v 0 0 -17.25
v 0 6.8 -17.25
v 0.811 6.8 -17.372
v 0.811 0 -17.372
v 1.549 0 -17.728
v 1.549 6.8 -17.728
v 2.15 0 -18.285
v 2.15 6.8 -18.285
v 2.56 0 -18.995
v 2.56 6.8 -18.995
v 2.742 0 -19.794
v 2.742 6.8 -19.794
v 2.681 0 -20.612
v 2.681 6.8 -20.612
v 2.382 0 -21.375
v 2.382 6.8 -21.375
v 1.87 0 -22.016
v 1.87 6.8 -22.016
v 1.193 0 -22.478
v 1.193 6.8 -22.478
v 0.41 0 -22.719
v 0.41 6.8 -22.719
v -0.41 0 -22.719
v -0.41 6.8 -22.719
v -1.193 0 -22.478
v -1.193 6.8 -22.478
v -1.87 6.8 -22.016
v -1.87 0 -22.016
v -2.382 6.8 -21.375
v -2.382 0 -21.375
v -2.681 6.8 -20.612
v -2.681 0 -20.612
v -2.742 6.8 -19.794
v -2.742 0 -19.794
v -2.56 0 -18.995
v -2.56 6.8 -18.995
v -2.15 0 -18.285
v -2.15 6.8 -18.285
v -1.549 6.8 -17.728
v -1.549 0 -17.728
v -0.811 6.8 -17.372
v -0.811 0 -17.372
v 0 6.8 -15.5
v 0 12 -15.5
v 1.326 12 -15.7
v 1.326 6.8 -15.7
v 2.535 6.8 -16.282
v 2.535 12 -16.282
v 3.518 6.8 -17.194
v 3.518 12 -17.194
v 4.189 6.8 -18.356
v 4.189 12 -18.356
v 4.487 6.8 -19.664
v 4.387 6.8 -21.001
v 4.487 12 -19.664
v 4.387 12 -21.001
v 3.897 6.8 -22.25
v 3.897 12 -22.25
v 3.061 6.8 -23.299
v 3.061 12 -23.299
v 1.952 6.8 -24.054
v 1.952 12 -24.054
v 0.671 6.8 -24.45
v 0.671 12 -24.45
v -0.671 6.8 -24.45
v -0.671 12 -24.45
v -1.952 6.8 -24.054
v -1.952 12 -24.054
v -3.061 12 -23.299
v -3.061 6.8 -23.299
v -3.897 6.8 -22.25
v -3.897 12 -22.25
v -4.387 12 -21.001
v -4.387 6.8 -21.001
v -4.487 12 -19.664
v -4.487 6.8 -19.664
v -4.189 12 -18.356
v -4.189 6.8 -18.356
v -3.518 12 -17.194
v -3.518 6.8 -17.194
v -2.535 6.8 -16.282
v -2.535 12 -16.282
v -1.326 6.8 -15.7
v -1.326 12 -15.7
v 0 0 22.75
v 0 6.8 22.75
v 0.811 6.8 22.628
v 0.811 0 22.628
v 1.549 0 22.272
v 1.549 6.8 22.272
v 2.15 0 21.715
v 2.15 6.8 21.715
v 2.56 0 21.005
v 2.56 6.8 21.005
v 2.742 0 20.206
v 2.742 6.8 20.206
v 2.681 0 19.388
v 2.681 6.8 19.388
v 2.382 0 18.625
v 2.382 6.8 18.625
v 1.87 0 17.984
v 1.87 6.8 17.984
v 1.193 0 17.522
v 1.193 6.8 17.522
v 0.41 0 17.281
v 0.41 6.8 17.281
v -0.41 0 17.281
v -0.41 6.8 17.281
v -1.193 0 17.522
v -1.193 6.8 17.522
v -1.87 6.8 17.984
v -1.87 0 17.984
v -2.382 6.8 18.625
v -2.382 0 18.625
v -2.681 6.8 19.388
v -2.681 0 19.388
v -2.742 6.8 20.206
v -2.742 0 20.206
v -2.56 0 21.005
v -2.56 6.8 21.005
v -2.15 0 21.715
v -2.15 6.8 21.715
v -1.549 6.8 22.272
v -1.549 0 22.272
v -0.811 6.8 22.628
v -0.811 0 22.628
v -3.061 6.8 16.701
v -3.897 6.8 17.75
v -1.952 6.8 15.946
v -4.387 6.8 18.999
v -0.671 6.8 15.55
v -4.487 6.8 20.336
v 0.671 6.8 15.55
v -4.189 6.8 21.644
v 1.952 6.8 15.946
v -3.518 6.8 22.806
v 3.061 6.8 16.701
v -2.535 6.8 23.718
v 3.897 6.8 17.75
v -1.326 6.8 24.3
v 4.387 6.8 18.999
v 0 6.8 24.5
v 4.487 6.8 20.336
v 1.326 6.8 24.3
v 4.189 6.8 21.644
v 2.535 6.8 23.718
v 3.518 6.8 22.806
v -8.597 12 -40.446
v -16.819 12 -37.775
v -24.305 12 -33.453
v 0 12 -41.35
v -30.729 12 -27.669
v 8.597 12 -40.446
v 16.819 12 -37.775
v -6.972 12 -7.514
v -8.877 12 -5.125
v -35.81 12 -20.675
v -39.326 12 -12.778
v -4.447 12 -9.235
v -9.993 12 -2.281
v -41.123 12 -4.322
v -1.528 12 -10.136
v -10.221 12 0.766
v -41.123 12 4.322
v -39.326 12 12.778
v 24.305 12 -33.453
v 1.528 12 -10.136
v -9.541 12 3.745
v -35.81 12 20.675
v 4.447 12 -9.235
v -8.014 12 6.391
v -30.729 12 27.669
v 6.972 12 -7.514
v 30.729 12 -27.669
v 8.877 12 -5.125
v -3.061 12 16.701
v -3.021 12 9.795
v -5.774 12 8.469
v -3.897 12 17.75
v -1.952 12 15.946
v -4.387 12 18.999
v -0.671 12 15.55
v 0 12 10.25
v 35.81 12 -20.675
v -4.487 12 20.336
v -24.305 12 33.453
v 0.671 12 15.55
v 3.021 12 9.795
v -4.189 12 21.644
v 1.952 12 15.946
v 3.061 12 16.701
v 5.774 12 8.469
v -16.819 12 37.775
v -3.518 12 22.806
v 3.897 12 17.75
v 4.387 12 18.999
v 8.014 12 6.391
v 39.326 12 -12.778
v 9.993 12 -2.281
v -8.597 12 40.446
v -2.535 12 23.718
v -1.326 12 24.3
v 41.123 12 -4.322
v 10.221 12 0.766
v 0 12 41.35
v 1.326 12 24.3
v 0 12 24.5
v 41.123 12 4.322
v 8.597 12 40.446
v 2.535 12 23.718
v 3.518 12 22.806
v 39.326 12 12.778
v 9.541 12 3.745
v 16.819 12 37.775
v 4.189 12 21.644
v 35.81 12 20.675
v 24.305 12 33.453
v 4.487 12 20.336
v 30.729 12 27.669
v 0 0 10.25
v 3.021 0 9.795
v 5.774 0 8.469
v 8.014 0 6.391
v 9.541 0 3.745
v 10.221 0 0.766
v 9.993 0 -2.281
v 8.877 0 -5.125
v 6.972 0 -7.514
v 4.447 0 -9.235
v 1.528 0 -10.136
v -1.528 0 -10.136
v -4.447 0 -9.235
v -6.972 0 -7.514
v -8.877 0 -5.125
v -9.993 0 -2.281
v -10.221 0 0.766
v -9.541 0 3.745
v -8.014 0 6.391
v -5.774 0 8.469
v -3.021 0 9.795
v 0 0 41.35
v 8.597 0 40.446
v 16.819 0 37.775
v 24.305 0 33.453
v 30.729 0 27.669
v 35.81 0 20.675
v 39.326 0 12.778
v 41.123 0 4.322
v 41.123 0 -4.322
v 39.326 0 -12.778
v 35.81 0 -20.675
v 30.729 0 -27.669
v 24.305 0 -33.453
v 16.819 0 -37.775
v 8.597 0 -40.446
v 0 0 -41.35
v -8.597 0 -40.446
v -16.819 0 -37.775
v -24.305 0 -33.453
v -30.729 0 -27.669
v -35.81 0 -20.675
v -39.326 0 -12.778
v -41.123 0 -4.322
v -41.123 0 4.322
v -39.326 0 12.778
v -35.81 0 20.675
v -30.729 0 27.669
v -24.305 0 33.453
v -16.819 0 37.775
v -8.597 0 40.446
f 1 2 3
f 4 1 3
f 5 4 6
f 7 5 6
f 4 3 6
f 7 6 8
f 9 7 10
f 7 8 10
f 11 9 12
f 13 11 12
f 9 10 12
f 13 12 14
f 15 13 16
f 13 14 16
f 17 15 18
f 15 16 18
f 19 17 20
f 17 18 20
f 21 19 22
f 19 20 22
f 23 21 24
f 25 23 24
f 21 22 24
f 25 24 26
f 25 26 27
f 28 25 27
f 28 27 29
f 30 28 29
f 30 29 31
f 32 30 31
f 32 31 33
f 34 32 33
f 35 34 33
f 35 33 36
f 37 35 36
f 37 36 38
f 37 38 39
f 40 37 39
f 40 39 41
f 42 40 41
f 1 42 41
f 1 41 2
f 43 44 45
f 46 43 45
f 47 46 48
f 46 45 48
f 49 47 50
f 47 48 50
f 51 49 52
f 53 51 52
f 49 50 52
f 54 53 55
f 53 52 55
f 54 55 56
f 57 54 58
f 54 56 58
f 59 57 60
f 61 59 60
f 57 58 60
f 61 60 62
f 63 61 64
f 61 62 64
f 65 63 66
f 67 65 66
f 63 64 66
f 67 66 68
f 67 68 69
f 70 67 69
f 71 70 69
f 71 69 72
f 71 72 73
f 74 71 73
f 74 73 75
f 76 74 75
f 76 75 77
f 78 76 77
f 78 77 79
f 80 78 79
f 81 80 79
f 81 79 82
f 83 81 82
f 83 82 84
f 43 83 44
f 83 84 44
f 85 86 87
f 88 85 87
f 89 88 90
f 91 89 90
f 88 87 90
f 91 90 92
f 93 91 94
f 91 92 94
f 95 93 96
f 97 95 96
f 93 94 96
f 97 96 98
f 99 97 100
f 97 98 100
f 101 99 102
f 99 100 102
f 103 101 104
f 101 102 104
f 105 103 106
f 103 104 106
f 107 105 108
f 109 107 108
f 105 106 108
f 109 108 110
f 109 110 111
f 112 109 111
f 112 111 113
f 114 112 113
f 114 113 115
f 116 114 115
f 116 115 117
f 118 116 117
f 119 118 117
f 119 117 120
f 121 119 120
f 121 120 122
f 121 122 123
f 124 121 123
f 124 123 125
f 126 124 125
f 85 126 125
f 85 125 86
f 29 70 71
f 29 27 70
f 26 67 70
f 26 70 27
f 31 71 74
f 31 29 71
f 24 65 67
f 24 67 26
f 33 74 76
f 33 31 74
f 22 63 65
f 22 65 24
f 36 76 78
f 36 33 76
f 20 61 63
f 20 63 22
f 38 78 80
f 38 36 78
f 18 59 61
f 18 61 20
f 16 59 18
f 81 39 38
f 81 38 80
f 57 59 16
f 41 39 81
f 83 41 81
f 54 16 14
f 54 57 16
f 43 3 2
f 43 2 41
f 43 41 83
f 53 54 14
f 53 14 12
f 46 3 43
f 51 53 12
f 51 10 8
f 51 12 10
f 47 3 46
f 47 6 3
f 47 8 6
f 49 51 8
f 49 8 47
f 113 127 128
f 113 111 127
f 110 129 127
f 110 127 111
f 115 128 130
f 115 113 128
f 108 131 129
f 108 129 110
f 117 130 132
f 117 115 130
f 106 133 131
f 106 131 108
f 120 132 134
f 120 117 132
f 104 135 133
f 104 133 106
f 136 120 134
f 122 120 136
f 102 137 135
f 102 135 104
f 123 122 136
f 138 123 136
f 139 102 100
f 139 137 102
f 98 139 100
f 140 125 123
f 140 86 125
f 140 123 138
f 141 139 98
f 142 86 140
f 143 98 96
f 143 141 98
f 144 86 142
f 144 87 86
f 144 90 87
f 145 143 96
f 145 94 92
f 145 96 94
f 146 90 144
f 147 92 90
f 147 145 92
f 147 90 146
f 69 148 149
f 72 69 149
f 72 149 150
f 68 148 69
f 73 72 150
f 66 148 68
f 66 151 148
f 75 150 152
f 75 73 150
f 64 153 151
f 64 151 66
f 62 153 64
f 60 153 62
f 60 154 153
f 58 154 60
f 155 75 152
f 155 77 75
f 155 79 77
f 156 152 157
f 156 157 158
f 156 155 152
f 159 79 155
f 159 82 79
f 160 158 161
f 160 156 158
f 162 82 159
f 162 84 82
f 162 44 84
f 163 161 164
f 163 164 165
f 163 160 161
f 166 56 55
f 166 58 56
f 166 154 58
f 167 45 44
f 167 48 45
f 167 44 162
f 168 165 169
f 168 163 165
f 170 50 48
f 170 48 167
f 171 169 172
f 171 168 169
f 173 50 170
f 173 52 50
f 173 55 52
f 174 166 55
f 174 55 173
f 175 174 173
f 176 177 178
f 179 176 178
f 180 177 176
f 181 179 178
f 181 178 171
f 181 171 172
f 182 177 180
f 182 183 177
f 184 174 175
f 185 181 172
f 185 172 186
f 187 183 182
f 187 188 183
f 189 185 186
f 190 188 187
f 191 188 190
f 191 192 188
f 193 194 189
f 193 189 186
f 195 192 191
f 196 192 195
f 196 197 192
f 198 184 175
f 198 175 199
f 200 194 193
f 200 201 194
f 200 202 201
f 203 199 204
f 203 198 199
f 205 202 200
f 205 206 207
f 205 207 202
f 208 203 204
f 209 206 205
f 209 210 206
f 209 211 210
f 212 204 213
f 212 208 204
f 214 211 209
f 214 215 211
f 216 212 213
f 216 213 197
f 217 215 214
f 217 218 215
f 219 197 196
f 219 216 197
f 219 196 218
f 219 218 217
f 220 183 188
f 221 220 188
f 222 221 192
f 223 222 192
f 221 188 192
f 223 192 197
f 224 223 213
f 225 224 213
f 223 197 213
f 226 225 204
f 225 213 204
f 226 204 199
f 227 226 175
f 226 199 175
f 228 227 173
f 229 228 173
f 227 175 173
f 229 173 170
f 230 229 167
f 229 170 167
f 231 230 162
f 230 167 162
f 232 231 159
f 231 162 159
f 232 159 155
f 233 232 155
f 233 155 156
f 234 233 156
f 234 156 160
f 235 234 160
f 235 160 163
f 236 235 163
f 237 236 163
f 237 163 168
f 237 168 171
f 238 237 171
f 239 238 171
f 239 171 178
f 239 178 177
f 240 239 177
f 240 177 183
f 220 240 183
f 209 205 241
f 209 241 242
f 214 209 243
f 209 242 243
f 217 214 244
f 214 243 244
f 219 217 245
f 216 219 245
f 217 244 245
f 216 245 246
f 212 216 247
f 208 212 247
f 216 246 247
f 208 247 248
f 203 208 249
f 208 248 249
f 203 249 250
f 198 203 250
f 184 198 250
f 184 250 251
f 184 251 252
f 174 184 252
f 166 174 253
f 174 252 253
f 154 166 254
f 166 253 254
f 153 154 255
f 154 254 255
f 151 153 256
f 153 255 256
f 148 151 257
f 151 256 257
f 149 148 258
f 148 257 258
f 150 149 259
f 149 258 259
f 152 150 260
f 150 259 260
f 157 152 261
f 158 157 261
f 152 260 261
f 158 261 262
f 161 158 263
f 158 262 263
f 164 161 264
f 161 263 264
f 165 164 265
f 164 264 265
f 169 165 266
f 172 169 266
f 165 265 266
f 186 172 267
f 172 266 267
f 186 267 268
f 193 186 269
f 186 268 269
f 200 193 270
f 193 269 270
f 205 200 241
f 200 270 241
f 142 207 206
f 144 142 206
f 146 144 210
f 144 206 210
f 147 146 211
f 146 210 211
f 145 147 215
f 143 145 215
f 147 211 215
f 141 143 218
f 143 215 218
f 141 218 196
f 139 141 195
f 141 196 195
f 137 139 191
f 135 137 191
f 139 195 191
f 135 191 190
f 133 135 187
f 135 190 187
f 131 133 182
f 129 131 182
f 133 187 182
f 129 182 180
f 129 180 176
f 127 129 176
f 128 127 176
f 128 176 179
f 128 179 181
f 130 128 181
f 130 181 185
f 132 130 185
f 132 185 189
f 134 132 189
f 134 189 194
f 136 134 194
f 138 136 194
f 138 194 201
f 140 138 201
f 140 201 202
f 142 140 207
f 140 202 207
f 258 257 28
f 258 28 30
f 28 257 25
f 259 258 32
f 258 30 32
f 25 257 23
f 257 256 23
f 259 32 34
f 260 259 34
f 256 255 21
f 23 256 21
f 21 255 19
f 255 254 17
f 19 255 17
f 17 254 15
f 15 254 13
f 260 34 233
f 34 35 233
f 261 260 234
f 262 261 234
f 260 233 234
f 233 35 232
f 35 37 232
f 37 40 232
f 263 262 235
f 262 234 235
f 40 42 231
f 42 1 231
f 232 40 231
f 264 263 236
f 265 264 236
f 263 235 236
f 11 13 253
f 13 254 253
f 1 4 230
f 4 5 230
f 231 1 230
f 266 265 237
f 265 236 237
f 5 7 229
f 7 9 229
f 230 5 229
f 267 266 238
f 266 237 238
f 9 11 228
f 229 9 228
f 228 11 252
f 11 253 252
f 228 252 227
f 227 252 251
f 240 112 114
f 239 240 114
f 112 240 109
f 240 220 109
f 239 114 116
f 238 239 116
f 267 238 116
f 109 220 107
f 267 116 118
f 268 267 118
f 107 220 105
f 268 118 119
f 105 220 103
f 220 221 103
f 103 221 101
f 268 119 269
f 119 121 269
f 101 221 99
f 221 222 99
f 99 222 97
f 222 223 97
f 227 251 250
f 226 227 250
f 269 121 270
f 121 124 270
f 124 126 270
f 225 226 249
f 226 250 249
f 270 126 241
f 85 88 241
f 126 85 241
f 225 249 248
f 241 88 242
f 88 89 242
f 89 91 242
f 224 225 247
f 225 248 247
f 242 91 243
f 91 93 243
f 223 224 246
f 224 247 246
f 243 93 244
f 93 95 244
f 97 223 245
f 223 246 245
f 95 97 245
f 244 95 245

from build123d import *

# Parameters (mm, degrees)
SKETCH1_R           = 41.35
BOSS_EXTRUDE1_DEPTH = 12
SKETCH2_R           = 2.75
CUT_EXTRUDE1_DEPTH  = 25
SKETCH4_R           = 10.25
CUT_EXTRUDE2_DEPTH  = 25
SKETCH3_R           = 4.5
CUT_EXTRUDE3_DEPTH  = 5.2


with BuildPart() as part:
    # Sketch1 → Boss-Extrude1 (new body)
    with BuildSketch(Plane(origin=(0, 0, 0), x_dir=(1, 0, 0), z_dir=(0, 1, 0))):
        with Locations(Location((0, 0, 0), (0, 0, 270))):
            Circle(SKETCH1_R)
    extrude(amount=BOSS_EXTRUDE1_DEPTH)

    # Sketch2 → Cut-Extrude1 (cut)
    with BuildSketch(Plane(origin=(0, 12, 0), x_dir=(1, 0, 0), z_dir=(0, 1, 0))):
        with Locations(Location((0, 20, 0), (0, 0, 270))):
            Circle(SKETCH2_R)
        with Locations(Location((0, -20, 0), (0, 0, 270))):
            Circle(SKETCH2_R)
    extrude(amount=-CUT_EXTRUDE1_DEPTH, mode=Mode.SUBTRACT)

    # Sketch4 → Cut-Extrude2 (cut)
    with BuildSketch(Plane(origin=(0, 12, 0), x_dir=(1, 0, 0), z_dir=(0, 1, 0))):
        with Locations(Location((0, 0, 0), (0, 0, 270))):
            Circle(SKETCH4_R)
    extrude(amount=-CUT_EXTRUDE2_DEPTH, mode=Mode.SUBTRACT)

    # Sketch3 → Cut-Extrude3 (cut)
    with BuildSketch(Plane(origin=(0, 12, 0), x_dir=(1, 0, 0), z_dir=(0, 1, 0))):
        with Locations(Location((0, 20, 0), (0, 0, 270))):
            Circle(SKETCH3_R)
        with Locations(Location((0, -20, 0), (0, 0, 270))):
            Circle(SKETCH3_R)
    extrude(amount=-CUT_EXTRUDE3_DEPTH, mode=Mode.SUBTRACT)


solid = part.part
